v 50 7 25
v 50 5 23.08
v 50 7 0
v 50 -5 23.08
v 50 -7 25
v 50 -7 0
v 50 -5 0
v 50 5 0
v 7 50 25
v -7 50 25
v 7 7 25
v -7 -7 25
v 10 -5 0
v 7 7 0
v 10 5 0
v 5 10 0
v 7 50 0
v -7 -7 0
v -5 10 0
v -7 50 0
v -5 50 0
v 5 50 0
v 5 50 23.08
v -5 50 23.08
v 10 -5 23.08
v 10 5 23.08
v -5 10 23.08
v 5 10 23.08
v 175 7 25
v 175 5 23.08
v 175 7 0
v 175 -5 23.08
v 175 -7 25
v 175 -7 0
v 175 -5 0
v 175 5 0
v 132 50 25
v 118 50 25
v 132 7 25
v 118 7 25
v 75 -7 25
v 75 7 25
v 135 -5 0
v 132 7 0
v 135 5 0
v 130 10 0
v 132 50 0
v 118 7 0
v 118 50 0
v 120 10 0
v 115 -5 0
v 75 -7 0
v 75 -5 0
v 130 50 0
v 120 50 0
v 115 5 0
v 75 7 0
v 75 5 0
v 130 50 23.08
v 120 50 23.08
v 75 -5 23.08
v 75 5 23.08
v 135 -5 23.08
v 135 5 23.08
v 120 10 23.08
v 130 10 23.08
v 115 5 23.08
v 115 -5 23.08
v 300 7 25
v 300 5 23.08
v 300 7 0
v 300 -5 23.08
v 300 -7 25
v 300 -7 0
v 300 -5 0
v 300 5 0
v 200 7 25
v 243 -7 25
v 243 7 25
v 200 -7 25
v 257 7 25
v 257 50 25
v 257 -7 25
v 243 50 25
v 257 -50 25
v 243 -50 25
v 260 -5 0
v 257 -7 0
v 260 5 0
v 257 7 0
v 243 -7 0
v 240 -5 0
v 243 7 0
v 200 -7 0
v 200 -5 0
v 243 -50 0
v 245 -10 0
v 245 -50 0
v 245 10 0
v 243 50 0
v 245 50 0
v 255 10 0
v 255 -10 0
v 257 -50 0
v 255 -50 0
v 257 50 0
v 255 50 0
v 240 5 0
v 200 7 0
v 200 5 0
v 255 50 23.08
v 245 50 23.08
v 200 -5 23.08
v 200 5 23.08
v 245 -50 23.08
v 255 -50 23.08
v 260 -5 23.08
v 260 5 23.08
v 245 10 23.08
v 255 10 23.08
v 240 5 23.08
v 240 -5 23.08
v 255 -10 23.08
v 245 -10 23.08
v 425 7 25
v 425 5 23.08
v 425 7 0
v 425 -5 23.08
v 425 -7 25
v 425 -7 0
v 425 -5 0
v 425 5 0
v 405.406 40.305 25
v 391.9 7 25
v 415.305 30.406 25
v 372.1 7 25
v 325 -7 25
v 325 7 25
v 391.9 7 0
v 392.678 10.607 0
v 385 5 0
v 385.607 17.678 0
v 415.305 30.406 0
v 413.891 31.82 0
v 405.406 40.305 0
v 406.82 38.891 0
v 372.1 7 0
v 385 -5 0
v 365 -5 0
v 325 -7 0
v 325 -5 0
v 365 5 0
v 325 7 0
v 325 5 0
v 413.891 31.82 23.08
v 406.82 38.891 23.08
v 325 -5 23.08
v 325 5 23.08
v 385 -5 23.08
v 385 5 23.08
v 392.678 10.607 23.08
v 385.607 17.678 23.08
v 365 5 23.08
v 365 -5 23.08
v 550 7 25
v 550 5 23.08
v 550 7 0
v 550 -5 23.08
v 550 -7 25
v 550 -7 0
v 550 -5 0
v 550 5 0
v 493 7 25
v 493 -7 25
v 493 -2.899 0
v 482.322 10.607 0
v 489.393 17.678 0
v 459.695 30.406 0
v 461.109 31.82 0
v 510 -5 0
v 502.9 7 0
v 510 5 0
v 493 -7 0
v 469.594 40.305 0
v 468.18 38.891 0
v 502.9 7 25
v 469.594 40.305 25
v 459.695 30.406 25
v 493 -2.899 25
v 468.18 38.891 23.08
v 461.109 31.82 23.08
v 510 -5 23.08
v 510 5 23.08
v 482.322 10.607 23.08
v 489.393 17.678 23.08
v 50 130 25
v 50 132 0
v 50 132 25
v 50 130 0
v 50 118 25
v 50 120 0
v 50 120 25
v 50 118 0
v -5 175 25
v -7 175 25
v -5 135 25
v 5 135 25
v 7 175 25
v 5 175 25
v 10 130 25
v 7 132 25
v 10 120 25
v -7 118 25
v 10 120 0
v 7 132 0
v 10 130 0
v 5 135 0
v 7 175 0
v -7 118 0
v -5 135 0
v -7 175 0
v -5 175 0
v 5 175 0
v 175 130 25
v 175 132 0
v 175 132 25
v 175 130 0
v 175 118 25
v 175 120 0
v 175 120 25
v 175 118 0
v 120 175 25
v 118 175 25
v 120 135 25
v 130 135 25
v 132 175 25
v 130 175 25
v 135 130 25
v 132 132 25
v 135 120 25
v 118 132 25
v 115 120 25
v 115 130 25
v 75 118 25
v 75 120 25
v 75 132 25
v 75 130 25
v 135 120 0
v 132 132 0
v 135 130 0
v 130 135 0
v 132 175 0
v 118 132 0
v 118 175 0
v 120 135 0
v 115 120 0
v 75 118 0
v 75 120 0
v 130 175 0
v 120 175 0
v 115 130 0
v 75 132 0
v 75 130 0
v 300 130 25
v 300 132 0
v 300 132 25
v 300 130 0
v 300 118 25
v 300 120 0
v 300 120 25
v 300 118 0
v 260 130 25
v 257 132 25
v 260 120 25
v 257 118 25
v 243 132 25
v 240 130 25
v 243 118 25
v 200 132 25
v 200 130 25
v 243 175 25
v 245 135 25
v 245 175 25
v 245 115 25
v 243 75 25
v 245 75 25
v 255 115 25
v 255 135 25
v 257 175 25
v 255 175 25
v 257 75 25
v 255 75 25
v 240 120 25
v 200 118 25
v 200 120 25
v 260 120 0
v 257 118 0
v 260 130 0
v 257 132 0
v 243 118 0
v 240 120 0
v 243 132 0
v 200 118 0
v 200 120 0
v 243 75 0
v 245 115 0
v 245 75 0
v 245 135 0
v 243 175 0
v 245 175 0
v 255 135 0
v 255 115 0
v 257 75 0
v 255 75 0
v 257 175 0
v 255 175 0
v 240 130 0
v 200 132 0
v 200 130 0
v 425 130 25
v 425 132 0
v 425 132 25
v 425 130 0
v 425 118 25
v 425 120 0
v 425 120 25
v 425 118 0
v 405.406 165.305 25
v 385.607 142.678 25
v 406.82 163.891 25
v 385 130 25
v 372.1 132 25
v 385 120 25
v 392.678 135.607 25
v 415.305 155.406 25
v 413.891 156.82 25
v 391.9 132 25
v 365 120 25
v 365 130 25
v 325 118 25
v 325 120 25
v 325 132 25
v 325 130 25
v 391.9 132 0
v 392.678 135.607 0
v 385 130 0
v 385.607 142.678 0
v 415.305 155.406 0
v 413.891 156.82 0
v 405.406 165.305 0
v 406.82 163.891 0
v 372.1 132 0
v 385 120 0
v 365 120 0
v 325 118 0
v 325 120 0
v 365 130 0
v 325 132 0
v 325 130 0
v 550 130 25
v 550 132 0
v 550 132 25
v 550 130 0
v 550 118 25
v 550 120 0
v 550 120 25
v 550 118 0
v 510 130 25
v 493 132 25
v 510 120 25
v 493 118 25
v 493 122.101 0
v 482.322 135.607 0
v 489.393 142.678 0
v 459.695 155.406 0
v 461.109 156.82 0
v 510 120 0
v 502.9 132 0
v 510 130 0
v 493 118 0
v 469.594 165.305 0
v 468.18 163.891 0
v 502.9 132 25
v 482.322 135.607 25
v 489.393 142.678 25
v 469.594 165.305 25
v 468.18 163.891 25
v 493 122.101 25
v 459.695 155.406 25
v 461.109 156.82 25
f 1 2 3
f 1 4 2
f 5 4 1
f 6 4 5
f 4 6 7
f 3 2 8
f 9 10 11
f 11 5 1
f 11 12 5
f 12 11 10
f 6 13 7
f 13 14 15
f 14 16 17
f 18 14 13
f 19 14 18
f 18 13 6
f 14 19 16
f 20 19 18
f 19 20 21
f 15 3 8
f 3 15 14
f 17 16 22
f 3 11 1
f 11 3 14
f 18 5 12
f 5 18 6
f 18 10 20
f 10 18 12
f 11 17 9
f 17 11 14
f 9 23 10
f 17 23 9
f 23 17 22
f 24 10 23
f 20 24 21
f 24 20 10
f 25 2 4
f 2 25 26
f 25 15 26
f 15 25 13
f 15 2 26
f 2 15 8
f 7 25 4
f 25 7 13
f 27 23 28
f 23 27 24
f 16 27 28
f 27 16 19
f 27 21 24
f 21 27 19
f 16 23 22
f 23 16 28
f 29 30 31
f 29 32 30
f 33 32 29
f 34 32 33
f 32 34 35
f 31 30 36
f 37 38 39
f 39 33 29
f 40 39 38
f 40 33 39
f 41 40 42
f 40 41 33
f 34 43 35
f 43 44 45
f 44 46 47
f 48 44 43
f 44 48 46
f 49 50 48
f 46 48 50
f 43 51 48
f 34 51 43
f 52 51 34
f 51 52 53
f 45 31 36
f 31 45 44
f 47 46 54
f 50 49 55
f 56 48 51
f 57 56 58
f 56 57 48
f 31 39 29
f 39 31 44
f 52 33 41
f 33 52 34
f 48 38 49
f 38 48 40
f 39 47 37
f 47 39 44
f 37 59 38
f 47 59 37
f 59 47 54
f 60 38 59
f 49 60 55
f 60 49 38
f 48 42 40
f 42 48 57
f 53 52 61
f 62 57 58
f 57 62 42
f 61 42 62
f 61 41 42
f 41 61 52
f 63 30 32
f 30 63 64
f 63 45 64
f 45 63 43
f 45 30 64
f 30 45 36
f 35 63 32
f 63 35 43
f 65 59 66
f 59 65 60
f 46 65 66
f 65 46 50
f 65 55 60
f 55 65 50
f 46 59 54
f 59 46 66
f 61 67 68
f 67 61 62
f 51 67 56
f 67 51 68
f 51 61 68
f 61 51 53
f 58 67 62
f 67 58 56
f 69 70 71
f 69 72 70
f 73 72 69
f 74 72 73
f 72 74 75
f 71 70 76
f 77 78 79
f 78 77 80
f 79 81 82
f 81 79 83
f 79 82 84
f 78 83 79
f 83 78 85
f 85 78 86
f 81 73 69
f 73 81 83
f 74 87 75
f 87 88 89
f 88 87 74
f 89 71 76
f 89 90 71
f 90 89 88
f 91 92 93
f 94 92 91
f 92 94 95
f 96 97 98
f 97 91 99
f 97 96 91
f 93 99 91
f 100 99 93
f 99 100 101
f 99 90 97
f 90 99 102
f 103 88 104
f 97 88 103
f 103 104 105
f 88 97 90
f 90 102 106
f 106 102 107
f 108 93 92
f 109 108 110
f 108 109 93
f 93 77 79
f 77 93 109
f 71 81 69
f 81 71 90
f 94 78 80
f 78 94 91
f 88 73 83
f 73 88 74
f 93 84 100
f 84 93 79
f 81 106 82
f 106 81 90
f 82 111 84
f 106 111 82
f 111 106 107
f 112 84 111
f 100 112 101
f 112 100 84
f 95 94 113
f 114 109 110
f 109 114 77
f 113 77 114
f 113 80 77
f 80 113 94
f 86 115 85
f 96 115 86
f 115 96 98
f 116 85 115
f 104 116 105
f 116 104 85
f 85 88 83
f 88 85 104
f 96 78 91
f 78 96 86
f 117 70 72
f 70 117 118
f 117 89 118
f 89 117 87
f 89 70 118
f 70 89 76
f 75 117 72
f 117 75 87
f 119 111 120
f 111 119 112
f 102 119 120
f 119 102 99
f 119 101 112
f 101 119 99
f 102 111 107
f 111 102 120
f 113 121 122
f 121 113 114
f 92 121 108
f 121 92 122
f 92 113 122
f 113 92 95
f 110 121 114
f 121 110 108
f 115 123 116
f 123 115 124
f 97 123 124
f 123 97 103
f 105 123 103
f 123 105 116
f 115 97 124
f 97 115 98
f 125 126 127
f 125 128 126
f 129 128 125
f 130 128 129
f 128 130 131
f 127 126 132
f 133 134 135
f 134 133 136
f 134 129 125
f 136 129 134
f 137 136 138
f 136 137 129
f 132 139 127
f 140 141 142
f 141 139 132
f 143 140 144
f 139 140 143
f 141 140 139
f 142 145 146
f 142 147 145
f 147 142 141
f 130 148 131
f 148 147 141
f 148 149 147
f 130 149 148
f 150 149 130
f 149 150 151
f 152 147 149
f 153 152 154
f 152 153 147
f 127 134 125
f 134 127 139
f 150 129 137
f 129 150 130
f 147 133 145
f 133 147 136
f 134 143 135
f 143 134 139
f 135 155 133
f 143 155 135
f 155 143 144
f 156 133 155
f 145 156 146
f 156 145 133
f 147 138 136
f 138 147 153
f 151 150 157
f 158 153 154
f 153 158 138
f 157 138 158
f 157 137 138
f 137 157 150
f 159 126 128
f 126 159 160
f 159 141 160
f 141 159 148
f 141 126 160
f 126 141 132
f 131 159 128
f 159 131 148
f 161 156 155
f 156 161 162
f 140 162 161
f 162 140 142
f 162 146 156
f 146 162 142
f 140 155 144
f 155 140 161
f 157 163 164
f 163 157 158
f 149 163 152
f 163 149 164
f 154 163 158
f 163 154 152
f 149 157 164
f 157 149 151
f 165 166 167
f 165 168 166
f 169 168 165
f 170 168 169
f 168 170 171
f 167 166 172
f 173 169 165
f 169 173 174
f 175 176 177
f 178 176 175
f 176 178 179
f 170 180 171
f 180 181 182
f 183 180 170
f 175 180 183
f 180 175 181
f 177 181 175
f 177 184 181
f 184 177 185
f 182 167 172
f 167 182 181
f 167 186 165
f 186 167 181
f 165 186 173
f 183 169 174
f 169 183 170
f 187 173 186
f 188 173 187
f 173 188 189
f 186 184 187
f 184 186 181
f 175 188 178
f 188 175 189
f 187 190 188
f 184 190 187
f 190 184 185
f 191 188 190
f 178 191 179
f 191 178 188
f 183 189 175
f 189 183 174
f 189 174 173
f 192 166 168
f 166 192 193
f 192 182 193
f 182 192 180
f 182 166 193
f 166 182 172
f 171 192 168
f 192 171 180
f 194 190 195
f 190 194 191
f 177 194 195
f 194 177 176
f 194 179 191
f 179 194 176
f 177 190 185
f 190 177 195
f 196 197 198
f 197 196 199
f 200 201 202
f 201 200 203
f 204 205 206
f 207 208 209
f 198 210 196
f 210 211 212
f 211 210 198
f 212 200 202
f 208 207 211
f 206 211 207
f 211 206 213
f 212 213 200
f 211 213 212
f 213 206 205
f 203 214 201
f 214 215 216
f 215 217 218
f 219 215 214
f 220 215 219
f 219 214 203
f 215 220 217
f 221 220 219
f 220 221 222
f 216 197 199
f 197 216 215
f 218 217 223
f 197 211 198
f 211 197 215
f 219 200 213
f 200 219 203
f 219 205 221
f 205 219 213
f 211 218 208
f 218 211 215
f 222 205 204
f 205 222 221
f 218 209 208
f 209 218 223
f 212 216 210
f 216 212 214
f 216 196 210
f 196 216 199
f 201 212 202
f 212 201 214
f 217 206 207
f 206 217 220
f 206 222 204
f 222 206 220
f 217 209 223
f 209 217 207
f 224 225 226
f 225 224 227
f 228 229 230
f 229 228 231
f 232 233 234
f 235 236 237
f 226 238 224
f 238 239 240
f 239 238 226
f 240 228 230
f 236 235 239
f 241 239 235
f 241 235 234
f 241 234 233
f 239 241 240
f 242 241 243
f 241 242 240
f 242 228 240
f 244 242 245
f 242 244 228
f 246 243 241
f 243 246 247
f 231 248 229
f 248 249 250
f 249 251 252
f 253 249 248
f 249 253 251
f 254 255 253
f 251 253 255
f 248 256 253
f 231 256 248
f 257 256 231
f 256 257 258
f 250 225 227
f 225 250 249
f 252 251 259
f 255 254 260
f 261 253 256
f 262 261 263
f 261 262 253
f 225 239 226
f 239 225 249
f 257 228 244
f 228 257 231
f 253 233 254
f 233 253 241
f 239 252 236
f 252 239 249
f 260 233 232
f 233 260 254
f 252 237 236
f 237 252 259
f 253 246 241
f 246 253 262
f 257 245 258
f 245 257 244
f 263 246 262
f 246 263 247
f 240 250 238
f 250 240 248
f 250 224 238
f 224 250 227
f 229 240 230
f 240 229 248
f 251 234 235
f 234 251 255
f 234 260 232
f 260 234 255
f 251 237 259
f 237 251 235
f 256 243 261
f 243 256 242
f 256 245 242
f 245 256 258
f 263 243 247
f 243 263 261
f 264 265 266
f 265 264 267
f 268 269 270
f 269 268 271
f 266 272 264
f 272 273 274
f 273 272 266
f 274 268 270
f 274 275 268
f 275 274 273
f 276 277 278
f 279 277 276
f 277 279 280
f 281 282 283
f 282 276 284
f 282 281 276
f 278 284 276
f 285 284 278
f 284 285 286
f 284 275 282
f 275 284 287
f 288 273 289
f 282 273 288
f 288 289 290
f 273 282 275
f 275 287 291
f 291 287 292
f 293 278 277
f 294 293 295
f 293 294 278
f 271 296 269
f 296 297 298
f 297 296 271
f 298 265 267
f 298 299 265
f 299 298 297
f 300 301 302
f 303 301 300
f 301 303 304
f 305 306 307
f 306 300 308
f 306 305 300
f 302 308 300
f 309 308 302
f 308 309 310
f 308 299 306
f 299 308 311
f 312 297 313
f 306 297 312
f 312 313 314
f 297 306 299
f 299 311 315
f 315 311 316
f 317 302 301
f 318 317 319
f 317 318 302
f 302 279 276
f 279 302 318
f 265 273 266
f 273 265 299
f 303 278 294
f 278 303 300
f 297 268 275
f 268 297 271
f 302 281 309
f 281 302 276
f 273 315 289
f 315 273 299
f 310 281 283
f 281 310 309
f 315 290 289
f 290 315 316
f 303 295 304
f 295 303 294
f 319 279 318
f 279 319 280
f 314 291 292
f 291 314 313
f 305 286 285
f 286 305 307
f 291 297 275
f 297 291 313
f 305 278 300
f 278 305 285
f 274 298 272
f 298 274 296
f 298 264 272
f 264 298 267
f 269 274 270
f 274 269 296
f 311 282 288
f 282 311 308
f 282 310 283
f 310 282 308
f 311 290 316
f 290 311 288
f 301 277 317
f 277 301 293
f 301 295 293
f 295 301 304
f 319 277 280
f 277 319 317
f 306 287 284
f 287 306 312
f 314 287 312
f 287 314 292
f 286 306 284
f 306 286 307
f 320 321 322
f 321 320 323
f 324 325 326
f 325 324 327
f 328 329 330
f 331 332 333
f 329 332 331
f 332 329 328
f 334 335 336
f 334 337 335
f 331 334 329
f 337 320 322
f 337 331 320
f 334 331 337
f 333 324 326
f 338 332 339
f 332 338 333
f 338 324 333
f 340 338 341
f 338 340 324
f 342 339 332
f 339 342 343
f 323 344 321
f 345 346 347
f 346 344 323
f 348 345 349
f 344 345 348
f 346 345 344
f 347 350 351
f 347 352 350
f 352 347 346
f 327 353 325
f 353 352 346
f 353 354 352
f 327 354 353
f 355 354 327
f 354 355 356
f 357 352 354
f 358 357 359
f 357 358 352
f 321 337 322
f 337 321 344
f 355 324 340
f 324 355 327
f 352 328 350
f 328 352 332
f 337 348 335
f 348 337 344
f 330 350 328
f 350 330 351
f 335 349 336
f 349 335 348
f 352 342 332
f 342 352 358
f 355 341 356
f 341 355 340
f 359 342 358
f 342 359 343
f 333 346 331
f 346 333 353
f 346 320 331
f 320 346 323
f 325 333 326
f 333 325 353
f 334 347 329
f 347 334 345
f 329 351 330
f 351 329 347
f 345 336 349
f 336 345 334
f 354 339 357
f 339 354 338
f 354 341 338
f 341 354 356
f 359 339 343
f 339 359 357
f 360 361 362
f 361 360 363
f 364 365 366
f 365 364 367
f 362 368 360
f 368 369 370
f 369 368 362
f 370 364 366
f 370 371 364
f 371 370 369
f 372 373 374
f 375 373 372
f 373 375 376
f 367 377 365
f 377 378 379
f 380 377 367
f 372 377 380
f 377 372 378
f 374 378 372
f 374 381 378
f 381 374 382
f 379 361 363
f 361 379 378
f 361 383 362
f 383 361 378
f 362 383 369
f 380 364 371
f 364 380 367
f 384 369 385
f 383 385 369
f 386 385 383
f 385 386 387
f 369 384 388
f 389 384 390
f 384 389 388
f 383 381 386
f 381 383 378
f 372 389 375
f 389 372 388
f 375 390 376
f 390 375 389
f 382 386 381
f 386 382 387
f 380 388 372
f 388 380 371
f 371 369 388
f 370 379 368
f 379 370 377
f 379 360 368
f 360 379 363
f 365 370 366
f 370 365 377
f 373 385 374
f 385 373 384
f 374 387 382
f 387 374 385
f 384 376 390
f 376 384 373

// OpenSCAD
height = 25;
length = 50;
wallThickness = 2;
dividerThickness = 10;


fillTop = 1;
fillBottom = 0;
fillBack = 1;
fudge = 0.02;

layout = length * 2.5;
translate([0,0,0])
Corner(height, length, wallThickness, dividerThickness, fillTop, fillBottom, fillBack);

translate([layout, 0,0])
Tjunction(height, length, wallThickness, dividerThickness, fillTop, fillBottom, fillBack);

translate([layout*2,0,0])
Xjunction(height, length, wallThickness, dividerThickness, fillTop, fillBottom, fillBack);

translate([layout*3,0,0])
Yjunction(height, length, wallThickness, dividerThickness, fillTop, fillBottom, fillBack);

translate([layout*4,0,0])
bend(height, length, wallThickness, dividerThickness, fillTop, fillBottom, fillBack);


translate([0,layout,0])
Corner(height, length, wallThickness, dividerThickness, 0, fillBottom, 1);

translate([layout,layout,0])
Tjunction(height, length, wallThickness, dividerThickness, 0, fillBottom, 1);

translate([layout*2,layout,0])
Xjunction(height, length, wallThickness, dividerThickness, 0, fillBottom, 1);

translate([layout*3,layout,0])
Yjunction(height, length, wallThickness, dividerThickness, 0, fillBottom, 1);

translate([layout*4,layout,0])
bend(height, length, wallThickness, dividerThickness, 0, fillBottom, 1);

module bend(
  height,
  length,
  wallThickness,
  dividerThickness,
  fillTop = 1,
  fillBottom = 1,
  fillBack = 0,
)
{
  sides = [
    [0,fillTop,fillBottom,fillBack],
    [135,fillTop,fillBottom,fillBack*2]];
  connector(
    height = height,
    length = length,
    wallThickness = wallThickness,
    dividerThickness = dividerThickness, 
    sides = sides
  );
}


module Yjunction(
  height,
  length,
  wallThickness,
  dividerThickness,
  fillTop = 1,
  fillBottom = 1,
  fillBack = 0,
)
{
  sides = [
    [0,fillTop,fillBottom,fillBack],
    [45,fillTop,fillBottom,fillBack*2],
    [180,fillTop,fillBottom,fillBack]];
  connector(
    height = height,
    length = length,
    wallThickness = wallThickness,
    dividerThickness = dividerThickness, 
    sides = sides
  );
}

module Tjunction(
  height,
  length,
  wallThickness,
  dividerThickness,
  fillTop = 1,
  fillBottom = 1,
  fillBack = 0,
)
{
  sides = [
    [0,fillTop,fillBottom,fillBack],
    [90,fillTop,fillBottom,fillBack],
    [180,fillTop,fillBottom,fillBack]];
  connector(
    height = height,
    length = length,
    wallThickness = wallThickness,
    dividerThickness = dividerThickness, 
    sides = sides
  );
}

module Xjunction(
  height,
  length,
  wallThickness,
  dividerThickness,
  fillTop = 1,
  fillBottom = 1,
  fillBack = 0,
)
{
  sides = [
    [0,fillTop,fillBottom,fillBack],
    [90,fillTop,fillBottom,fillBack],
    [180,fillTop,fillBottom,fillBack],
    [270,fillTop,fillBottom,fillBack]];
  connector(
    height = height,
    length = length,
    wallThickness = wallThickness,
    dividerThickness = dividerThickness, 
    sides = sides
  );
}

module Corner(
  height,
  length,
  wallThickness,
  dividerThickness,
  fillTop = 1,
  fillBottom = 1,
  fillBack = 0,
)
{
  sides = [[0,fillTop,fillBottom,fillBack],[90,fillTop,fillBottom,fillBack]];
  connector(
    height = height,
    length = length,
    wallThickness = wallThickness,
    dividerThickness = dividerThickness, 
    sides = sides
  );
}


module connector(
  height,
  length,
  wallThickness,
  dividerThickness,
  sides
) {
  thickness = dividerThickness + wallThickness*2;
  
  difference() {
    union(){

      translate([-thickness/2,-thickness/2,0])
      cube([thickness, thickness, height]);
  
      for (i = [ 0 : len(sides) - 1 ]) 
      {
        side=sides[i];
        angle = side[0];
        rotate(angle)
        translate([0,-thickness/2,0])
        cube([length, thickness, height]);
      }
    }
  
    for (i = [ 0 : len(sides) - 1 ]) 
    {
      side=sides[i];
      fillTop = side[1];
      fillBottom = side[2];
      fillBack = side[3];
      
      bottom = fillBottom * wallThickness + (fillBottom > 0 ? fudge : 0);
      top = fillTop * wallThickness + + (fillBottom > 0 ? fudge : 0);
      back = fillBack * dividerThickness;
      dividerHeight = height + fudge*4 - bottom - top;
      angle = side[0];
      rotate(angle)
      translate([0,-thickness/2,-fudge])
      translate([back,wallThickness,bottom])
      cube([length+back+fudge*2, dividerThickness ,dividerHeight +fudge]);
    }
  }
}
